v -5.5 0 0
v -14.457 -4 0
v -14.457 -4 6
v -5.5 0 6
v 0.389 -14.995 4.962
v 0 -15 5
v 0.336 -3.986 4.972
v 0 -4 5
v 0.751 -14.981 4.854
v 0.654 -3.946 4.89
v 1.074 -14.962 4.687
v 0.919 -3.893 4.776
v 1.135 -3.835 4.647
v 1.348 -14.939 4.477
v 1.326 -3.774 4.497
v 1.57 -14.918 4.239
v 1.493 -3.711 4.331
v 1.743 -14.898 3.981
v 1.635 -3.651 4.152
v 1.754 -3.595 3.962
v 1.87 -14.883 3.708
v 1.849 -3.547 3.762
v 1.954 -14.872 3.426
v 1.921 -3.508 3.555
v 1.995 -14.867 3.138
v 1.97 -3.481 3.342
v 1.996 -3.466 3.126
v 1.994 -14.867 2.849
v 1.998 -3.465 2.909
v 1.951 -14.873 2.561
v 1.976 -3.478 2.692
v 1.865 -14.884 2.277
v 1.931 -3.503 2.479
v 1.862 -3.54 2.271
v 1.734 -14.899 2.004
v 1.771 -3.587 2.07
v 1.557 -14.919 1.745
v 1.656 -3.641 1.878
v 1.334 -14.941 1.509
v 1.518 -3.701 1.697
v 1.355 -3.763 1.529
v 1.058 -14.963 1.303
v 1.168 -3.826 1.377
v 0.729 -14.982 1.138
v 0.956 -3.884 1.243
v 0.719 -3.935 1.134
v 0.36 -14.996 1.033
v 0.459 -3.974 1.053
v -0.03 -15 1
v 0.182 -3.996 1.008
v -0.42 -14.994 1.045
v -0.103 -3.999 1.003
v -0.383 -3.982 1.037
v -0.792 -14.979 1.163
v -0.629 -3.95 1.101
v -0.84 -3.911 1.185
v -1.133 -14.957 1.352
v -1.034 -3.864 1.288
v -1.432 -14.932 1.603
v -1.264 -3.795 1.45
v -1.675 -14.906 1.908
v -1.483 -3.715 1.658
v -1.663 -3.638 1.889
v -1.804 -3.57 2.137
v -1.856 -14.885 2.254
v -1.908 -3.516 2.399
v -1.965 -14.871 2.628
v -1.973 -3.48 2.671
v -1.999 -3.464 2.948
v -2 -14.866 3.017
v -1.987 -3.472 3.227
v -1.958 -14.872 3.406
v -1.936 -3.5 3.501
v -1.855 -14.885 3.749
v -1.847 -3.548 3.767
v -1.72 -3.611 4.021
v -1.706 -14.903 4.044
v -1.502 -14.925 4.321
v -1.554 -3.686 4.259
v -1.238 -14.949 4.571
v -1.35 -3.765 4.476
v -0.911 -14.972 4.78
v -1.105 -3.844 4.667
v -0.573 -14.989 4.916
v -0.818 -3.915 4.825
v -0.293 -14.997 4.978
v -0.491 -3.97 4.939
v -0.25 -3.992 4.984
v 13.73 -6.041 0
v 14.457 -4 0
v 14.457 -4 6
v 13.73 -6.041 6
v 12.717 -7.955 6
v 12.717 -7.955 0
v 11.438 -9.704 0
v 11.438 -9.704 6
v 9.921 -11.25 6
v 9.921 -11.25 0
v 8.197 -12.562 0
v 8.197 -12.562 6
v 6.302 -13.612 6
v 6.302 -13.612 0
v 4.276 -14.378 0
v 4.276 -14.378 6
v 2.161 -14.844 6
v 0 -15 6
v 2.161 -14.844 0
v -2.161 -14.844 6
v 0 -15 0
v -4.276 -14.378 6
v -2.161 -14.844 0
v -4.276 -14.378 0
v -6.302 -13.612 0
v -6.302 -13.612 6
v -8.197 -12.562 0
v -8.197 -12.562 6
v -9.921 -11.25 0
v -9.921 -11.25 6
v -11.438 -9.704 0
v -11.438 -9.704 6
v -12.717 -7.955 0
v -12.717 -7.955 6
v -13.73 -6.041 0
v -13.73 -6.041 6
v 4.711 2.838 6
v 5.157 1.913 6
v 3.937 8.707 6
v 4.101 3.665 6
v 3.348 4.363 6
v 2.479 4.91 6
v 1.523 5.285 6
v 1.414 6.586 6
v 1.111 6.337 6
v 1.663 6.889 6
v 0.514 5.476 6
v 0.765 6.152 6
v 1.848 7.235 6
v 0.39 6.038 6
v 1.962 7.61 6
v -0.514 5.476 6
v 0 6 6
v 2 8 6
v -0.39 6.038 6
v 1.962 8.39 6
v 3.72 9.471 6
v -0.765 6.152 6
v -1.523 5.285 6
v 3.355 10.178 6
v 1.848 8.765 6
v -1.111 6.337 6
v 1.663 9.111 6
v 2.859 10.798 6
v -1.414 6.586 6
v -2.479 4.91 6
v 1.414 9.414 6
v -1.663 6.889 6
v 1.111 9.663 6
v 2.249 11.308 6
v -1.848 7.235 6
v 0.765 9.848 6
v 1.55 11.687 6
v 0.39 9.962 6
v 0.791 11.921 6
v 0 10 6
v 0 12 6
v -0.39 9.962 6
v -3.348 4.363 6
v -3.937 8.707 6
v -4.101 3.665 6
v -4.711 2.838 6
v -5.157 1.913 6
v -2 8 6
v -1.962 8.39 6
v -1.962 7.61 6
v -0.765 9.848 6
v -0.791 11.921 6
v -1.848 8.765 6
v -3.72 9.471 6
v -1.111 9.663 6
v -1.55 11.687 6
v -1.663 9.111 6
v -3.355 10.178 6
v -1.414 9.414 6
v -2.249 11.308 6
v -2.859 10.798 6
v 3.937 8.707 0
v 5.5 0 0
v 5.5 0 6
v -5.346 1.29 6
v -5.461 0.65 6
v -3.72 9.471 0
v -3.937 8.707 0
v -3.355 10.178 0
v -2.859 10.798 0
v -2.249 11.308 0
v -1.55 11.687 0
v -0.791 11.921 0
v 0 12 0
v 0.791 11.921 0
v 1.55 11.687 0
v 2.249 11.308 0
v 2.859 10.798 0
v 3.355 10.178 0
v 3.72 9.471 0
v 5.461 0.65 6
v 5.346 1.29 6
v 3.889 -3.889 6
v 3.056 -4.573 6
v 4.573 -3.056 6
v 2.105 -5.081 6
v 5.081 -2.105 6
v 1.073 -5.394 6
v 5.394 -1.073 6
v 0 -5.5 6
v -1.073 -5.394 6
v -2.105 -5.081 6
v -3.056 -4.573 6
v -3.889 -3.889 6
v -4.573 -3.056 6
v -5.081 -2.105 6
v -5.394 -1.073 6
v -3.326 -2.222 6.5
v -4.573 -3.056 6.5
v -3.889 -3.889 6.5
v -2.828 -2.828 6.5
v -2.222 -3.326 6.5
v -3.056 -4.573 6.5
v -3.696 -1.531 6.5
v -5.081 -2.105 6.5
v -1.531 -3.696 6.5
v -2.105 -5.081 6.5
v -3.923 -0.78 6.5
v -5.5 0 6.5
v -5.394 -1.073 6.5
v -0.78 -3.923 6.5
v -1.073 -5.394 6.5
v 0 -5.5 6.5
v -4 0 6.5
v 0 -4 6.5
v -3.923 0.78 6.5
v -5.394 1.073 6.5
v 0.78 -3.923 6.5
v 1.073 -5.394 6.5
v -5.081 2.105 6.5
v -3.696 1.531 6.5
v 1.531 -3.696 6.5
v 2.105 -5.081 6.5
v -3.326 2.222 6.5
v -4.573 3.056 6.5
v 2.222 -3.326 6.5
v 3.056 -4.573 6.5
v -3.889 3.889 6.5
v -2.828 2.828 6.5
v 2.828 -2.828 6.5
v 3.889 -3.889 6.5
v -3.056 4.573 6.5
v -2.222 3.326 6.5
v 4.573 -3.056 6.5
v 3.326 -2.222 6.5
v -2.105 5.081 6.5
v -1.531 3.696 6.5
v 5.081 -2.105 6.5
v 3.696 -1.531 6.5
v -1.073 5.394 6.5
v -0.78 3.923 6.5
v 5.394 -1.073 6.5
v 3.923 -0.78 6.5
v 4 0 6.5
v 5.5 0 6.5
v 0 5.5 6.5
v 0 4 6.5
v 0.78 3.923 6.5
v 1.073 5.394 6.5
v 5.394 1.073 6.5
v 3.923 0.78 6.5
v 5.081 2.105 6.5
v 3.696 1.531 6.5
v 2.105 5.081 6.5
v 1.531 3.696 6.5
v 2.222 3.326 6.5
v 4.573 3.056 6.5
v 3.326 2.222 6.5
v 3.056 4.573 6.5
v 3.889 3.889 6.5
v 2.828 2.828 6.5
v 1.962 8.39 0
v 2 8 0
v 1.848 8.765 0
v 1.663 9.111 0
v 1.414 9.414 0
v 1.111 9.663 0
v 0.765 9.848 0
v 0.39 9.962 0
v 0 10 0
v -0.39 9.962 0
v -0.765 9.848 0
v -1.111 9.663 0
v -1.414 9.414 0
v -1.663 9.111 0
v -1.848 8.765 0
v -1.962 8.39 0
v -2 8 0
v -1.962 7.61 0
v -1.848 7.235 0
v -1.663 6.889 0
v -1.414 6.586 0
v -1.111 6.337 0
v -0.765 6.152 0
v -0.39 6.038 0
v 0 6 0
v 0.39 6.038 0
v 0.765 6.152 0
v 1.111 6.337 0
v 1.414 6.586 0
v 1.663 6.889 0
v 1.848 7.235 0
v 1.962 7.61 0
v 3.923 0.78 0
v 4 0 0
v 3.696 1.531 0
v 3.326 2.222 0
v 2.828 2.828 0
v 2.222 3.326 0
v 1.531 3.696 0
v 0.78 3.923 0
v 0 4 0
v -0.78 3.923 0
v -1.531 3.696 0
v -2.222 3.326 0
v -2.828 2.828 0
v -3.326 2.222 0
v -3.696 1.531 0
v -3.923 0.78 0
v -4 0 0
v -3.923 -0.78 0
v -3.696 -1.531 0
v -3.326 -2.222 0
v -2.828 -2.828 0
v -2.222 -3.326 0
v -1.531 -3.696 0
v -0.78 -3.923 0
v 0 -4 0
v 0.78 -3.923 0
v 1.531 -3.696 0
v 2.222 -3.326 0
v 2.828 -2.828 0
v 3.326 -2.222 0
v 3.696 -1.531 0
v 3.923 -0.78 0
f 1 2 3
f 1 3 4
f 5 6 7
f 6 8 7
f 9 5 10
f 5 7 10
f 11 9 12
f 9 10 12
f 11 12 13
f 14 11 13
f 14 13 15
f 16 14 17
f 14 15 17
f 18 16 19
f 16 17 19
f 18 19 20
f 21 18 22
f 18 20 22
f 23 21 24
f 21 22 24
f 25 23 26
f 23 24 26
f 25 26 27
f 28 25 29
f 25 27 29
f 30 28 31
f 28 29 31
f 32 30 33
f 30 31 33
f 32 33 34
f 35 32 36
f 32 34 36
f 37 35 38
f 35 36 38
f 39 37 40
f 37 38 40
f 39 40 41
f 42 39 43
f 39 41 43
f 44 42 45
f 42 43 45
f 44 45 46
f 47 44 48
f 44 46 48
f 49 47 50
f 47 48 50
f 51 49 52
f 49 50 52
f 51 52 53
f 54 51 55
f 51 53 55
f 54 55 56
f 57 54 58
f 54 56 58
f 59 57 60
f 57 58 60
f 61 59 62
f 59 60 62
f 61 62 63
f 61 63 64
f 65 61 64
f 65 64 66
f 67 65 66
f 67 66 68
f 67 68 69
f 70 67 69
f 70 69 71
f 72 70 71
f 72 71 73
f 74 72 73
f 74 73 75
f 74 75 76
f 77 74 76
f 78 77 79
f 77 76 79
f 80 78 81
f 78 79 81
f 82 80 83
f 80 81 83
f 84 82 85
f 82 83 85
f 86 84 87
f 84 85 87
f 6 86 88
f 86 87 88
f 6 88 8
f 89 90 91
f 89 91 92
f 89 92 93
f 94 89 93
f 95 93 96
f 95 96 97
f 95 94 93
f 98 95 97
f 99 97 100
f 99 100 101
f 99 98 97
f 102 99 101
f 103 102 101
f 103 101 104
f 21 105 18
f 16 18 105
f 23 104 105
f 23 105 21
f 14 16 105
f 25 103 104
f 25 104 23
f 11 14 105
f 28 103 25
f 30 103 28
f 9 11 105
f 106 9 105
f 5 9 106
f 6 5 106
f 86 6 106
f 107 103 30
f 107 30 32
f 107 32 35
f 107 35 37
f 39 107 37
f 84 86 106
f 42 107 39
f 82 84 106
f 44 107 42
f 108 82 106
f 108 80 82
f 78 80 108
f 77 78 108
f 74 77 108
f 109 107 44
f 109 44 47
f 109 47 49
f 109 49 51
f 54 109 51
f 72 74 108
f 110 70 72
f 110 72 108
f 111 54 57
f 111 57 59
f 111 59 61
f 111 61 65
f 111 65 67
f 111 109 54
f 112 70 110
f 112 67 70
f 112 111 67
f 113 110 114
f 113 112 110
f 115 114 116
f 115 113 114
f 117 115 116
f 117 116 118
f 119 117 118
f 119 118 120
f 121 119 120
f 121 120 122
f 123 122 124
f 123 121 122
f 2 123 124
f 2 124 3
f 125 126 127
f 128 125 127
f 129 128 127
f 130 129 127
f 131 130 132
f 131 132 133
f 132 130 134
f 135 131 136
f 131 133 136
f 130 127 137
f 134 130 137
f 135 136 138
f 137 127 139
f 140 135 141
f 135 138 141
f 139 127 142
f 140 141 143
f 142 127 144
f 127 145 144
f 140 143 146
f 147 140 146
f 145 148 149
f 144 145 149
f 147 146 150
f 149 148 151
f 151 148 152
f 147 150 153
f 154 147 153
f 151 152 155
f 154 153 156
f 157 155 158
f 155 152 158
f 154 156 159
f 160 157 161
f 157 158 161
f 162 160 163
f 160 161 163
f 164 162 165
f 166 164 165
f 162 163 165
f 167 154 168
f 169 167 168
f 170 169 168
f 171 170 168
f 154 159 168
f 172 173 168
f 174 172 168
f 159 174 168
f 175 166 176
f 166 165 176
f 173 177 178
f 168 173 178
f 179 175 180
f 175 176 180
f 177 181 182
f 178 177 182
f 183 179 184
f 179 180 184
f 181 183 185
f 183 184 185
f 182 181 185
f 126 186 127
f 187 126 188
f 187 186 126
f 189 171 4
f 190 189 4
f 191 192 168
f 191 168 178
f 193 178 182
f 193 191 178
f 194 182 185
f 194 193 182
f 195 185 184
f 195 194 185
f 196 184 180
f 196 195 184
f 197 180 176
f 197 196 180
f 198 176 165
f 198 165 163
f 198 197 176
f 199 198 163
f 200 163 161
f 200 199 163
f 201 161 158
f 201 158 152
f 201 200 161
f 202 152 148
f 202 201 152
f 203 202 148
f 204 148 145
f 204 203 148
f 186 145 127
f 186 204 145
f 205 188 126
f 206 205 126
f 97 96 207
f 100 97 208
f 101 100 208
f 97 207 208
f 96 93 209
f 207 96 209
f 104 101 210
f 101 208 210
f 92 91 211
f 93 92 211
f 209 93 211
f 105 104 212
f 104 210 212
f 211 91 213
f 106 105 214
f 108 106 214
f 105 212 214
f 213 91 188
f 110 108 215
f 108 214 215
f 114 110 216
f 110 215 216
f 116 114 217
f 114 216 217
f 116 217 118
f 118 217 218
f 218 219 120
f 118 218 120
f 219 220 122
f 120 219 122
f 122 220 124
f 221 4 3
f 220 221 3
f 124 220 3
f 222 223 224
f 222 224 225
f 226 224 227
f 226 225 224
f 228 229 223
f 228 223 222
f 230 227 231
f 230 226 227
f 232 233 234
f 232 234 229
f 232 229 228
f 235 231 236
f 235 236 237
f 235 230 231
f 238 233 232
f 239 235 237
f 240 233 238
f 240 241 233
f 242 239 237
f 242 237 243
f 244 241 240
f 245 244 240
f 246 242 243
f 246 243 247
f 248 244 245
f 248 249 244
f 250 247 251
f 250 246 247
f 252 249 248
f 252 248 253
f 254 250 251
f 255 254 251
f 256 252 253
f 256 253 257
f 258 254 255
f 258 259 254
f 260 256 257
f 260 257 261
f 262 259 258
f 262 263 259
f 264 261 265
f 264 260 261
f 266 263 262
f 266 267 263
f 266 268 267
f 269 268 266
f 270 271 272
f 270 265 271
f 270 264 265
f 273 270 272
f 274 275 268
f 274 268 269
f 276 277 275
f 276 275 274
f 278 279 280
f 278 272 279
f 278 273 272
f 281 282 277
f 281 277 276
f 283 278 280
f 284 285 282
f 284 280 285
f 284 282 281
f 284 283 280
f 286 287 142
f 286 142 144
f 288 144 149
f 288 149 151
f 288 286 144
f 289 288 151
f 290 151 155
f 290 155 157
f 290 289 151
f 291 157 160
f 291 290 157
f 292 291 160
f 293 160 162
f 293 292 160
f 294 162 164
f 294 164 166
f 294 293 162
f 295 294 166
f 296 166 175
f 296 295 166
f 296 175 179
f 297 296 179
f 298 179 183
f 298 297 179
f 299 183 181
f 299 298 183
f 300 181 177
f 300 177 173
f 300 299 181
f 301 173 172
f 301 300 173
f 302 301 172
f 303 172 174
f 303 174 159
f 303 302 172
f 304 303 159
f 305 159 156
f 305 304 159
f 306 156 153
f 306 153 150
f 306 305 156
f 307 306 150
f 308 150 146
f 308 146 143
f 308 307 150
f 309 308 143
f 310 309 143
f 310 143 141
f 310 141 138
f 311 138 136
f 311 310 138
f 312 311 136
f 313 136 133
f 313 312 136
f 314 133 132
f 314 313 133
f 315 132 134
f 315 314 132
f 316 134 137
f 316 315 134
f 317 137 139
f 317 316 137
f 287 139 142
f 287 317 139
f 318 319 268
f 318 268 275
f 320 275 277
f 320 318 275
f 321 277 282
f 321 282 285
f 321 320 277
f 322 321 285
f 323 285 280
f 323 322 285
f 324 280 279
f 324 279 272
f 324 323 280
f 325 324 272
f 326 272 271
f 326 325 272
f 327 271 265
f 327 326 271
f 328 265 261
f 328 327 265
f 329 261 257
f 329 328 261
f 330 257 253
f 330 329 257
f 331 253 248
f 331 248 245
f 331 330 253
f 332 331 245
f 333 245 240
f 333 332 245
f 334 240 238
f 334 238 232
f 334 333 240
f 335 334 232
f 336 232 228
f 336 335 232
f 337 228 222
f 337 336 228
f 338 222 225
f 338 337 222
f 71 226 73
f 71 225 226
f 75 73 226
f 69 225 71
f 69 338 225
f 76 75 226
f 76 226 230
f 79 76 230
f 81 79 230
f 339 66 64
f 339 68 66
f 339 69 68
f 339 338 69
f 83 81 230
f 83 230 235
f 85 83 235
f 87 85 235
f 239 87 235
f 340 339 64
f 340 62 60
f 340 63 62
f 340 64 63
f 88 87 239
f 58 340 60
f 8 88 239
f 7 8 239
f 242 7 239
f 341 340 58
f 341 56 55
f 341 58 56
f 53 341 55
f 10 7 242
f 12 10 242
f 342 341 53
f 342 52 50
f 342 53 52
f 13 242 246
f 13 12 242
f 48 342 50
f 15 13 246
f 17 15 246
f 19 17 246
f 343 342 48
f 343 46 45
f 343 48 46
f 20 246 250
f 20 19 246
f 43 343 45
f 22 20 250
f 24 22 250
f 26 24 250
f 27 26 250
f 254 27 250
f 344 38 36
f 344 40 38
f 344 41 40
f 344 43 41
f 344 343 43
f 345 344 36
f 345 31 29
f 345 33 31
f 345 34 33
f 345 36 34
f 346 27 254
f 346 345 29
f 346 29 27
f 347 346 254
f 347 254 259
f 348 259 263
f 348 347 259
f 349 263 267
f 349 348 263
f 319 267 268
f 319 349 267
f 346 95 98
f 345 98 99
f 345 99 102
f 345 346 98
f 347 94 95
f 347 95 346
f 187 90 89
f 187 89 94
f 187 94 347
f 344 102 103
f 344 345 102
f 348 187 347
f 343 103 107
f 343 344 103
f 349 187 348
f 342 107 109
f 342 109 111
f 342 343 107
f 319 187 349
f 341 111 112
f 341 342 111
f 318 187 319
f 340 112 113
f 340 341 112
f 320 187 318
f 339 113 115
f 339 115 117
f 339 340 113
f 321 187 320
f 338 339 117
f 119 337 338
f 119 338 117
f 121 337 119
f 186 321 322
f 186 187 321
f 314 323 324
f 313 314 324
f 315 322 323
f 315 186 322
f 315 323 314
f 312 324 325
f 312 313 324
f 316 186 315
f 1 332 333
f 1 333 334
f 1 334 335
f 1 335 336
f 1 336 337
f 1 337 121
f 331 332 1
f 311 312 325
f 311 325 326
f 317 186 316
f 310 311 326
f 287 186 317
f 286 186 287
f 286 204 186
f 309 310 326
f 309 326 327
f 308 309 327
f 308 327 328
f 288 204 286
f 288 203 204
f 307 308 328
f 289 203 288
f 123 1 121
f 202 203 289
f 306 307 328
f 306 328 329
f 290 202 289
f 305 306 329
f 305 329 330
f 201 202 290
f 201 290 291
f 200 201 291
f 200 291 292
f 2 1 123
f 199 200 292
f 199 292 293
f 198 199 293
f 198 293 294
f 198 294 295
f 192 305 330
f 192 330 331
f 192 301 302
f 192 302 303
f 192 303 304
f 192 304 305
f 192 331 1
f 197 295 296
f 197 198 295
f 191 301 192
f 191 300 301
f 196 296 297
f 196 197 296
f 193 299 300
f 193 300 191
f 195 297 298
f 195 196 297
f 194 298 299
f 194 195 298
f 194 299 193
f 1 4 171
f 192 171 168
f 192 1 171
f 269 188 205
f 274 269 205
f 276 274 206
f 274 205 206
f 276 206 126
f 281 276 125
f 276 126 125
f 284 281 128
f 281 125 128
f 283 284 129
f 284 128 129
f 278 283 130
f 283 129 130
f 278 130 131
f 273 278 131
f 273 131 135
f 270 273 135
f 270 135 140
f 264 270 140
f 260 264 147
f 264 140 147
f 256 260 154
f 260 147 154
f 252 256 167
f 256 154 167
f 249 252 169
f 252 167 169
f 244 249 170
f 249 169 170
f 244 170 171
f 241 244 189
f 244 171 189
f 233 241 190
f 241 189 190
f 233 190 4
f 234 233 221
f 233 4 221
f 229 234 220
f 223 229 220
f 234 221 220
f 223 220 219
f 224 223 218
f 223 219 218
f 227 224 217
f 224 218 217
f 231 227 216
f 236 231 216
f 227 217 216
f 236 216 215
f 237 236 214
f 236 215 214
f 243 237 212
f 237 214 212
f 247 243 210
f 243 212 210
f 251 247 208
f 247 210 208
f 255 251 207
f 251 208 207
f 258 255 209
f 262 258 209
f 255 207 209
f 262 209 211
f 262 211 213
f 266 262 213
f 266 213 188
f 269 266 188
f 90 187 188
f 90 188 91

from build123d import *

# Parameters (mm, degrees)
SKETCH1_R                           = 2
SKETCH1_R_2                         = 4
BOSS_EXTRUDE1_DEPTH                 = 6
SKETCH2_R                           = 5.5
SKETCH2_R_2                         = 4
BOSS_EXTRUDE2_DEPTH                 = 0.5
CUT_EXTRUDE1_REACH                  = 28.823
CUT_EXTRUDE1_END_RADIUS             = 15
CUT_EXTRUDE1_START                  = -5
SKETCH3_R                           = 2
CUT_EXTRUDE1_DIRECTION_2_REACH      = 28.823
CUT_EXTRUDE1_DIRECTION_2_END_RADIUS = 4


with BuildPart() as part:
    # Sketch1 → Boss-Extrude1 (new body)
    with BuildSketch(Plane.XY):
        with BuildLine():
            Line((5.5, 0), (14.456832295, -4))
            ThreePointArc((14.456832295, -4), (0, -15), (-14.456832295, -4))
            Line((-14.456832295, -4), (-5.5, 0))
            Line((-5.5, 0), (-3.937070517, 8.70673598))
            ThreePointArc((-3.937070517, 8.70673598), (0, 12), (3.937070517, 8.70673598))
            Line((3.937070517, 8.70673598), (5.5, 0))
        make_face()
        with Locations((0, 8)):
            Circle(SKETCH1_R, mode=Mode.SUBTRACT)
        Circle(SKETCH1_R_2, mode=Mode.SUBTRACT)
    extrude(amount=BOSS_EXTRUDE1_DEPTH)

    # Sketch2 → Boss-Extrude2 (add)
    with BuildSketch(Plane.XY.offset(6)):
        Circle(SKETCH2_R)
        Circle(SKETCH2_R_2, mode=Mode.SUBTRACT)
    extrude(amount=BOSS_EXTRUDE2_DEPTH)

    # Cut-Extrude1: up to this cylinder (the profile starts inside it)
    cut_extrude1_end = Plane(origin=(0, 0, 3), z_dir=(0, 0, -1)) * Cylinder(CUT_EXTRUDE1_END_RADIUS, 88.646, mode=Mode.PRIVATE)
    # Sketch3 → Cut-Extrude1 (cut, up to the surface)
    with BuildSketch(Plane(origin=(0, 0, 0), x_dir=(1, 0, 0), z_dir=(0, 1, 0)).offset(CUT_EXTRUDE1_START), mode=Mode.PRIVATE) as cut_extrude1_sk1:
        with Locations(Location((0, -3, 0), (0, 0, 270))):
            Circle(SKETCH3_R)
    cut_extrude1_tool1 = extrude(cut_extrude1_sk1.sketch, amount=-CUT_EXTRUDE1_REACH, mode=Mode.PRIVATE) & cut_extrude1_end
    add(cut_extrude1_tool1.solids().sort_by_distance((0, -5, 3))[0], mode=Mode.SUBTRACT)

    # Cut-Extrude1 direction 2: up to this cylinder (the profile starts outside it)
    cut_extrude1_direction_2_end = Plane(origin=(0, 0, 3), z_dir=(0, 0, -1)) * Cylinder(CUT_EXTRUDE1_DIRECTION_2_END_RADIUS, 66.646, mode=Mode.PRIVATE)
    # Sketch3 → Cut-Extrude1 direction 2 (cut, up to the surface)
    with BuildSketch(Plane(origin=(0, 0, 0), x_dir=(1, 0, 0), z_dir=(0, 1, 0)).offset(CUT_EXTRUDE1_START), mode=Mode.PRIVATE) as cut_extrude1_direction_2_sk1:
        with Locations(Location((0, -3, 0), (0, 0, 270))):
            Circle(SKETCH3_R)
    cut_extrude1_direction_2_tool1 = extrude(cut_extrude1_direction_2_sk1.sketch, amount=CUT_EXTRUDE1_DIRECTION_2_REACH, mode=Mode.PRIVATE) - cut_extrude1_direction_2_end
    add(cut_extrude1_direction_2_tool1.solids().sort_by_distance((0, -5, 3))[0], mode=Mode.SUBTRACT)


solid = part.part
